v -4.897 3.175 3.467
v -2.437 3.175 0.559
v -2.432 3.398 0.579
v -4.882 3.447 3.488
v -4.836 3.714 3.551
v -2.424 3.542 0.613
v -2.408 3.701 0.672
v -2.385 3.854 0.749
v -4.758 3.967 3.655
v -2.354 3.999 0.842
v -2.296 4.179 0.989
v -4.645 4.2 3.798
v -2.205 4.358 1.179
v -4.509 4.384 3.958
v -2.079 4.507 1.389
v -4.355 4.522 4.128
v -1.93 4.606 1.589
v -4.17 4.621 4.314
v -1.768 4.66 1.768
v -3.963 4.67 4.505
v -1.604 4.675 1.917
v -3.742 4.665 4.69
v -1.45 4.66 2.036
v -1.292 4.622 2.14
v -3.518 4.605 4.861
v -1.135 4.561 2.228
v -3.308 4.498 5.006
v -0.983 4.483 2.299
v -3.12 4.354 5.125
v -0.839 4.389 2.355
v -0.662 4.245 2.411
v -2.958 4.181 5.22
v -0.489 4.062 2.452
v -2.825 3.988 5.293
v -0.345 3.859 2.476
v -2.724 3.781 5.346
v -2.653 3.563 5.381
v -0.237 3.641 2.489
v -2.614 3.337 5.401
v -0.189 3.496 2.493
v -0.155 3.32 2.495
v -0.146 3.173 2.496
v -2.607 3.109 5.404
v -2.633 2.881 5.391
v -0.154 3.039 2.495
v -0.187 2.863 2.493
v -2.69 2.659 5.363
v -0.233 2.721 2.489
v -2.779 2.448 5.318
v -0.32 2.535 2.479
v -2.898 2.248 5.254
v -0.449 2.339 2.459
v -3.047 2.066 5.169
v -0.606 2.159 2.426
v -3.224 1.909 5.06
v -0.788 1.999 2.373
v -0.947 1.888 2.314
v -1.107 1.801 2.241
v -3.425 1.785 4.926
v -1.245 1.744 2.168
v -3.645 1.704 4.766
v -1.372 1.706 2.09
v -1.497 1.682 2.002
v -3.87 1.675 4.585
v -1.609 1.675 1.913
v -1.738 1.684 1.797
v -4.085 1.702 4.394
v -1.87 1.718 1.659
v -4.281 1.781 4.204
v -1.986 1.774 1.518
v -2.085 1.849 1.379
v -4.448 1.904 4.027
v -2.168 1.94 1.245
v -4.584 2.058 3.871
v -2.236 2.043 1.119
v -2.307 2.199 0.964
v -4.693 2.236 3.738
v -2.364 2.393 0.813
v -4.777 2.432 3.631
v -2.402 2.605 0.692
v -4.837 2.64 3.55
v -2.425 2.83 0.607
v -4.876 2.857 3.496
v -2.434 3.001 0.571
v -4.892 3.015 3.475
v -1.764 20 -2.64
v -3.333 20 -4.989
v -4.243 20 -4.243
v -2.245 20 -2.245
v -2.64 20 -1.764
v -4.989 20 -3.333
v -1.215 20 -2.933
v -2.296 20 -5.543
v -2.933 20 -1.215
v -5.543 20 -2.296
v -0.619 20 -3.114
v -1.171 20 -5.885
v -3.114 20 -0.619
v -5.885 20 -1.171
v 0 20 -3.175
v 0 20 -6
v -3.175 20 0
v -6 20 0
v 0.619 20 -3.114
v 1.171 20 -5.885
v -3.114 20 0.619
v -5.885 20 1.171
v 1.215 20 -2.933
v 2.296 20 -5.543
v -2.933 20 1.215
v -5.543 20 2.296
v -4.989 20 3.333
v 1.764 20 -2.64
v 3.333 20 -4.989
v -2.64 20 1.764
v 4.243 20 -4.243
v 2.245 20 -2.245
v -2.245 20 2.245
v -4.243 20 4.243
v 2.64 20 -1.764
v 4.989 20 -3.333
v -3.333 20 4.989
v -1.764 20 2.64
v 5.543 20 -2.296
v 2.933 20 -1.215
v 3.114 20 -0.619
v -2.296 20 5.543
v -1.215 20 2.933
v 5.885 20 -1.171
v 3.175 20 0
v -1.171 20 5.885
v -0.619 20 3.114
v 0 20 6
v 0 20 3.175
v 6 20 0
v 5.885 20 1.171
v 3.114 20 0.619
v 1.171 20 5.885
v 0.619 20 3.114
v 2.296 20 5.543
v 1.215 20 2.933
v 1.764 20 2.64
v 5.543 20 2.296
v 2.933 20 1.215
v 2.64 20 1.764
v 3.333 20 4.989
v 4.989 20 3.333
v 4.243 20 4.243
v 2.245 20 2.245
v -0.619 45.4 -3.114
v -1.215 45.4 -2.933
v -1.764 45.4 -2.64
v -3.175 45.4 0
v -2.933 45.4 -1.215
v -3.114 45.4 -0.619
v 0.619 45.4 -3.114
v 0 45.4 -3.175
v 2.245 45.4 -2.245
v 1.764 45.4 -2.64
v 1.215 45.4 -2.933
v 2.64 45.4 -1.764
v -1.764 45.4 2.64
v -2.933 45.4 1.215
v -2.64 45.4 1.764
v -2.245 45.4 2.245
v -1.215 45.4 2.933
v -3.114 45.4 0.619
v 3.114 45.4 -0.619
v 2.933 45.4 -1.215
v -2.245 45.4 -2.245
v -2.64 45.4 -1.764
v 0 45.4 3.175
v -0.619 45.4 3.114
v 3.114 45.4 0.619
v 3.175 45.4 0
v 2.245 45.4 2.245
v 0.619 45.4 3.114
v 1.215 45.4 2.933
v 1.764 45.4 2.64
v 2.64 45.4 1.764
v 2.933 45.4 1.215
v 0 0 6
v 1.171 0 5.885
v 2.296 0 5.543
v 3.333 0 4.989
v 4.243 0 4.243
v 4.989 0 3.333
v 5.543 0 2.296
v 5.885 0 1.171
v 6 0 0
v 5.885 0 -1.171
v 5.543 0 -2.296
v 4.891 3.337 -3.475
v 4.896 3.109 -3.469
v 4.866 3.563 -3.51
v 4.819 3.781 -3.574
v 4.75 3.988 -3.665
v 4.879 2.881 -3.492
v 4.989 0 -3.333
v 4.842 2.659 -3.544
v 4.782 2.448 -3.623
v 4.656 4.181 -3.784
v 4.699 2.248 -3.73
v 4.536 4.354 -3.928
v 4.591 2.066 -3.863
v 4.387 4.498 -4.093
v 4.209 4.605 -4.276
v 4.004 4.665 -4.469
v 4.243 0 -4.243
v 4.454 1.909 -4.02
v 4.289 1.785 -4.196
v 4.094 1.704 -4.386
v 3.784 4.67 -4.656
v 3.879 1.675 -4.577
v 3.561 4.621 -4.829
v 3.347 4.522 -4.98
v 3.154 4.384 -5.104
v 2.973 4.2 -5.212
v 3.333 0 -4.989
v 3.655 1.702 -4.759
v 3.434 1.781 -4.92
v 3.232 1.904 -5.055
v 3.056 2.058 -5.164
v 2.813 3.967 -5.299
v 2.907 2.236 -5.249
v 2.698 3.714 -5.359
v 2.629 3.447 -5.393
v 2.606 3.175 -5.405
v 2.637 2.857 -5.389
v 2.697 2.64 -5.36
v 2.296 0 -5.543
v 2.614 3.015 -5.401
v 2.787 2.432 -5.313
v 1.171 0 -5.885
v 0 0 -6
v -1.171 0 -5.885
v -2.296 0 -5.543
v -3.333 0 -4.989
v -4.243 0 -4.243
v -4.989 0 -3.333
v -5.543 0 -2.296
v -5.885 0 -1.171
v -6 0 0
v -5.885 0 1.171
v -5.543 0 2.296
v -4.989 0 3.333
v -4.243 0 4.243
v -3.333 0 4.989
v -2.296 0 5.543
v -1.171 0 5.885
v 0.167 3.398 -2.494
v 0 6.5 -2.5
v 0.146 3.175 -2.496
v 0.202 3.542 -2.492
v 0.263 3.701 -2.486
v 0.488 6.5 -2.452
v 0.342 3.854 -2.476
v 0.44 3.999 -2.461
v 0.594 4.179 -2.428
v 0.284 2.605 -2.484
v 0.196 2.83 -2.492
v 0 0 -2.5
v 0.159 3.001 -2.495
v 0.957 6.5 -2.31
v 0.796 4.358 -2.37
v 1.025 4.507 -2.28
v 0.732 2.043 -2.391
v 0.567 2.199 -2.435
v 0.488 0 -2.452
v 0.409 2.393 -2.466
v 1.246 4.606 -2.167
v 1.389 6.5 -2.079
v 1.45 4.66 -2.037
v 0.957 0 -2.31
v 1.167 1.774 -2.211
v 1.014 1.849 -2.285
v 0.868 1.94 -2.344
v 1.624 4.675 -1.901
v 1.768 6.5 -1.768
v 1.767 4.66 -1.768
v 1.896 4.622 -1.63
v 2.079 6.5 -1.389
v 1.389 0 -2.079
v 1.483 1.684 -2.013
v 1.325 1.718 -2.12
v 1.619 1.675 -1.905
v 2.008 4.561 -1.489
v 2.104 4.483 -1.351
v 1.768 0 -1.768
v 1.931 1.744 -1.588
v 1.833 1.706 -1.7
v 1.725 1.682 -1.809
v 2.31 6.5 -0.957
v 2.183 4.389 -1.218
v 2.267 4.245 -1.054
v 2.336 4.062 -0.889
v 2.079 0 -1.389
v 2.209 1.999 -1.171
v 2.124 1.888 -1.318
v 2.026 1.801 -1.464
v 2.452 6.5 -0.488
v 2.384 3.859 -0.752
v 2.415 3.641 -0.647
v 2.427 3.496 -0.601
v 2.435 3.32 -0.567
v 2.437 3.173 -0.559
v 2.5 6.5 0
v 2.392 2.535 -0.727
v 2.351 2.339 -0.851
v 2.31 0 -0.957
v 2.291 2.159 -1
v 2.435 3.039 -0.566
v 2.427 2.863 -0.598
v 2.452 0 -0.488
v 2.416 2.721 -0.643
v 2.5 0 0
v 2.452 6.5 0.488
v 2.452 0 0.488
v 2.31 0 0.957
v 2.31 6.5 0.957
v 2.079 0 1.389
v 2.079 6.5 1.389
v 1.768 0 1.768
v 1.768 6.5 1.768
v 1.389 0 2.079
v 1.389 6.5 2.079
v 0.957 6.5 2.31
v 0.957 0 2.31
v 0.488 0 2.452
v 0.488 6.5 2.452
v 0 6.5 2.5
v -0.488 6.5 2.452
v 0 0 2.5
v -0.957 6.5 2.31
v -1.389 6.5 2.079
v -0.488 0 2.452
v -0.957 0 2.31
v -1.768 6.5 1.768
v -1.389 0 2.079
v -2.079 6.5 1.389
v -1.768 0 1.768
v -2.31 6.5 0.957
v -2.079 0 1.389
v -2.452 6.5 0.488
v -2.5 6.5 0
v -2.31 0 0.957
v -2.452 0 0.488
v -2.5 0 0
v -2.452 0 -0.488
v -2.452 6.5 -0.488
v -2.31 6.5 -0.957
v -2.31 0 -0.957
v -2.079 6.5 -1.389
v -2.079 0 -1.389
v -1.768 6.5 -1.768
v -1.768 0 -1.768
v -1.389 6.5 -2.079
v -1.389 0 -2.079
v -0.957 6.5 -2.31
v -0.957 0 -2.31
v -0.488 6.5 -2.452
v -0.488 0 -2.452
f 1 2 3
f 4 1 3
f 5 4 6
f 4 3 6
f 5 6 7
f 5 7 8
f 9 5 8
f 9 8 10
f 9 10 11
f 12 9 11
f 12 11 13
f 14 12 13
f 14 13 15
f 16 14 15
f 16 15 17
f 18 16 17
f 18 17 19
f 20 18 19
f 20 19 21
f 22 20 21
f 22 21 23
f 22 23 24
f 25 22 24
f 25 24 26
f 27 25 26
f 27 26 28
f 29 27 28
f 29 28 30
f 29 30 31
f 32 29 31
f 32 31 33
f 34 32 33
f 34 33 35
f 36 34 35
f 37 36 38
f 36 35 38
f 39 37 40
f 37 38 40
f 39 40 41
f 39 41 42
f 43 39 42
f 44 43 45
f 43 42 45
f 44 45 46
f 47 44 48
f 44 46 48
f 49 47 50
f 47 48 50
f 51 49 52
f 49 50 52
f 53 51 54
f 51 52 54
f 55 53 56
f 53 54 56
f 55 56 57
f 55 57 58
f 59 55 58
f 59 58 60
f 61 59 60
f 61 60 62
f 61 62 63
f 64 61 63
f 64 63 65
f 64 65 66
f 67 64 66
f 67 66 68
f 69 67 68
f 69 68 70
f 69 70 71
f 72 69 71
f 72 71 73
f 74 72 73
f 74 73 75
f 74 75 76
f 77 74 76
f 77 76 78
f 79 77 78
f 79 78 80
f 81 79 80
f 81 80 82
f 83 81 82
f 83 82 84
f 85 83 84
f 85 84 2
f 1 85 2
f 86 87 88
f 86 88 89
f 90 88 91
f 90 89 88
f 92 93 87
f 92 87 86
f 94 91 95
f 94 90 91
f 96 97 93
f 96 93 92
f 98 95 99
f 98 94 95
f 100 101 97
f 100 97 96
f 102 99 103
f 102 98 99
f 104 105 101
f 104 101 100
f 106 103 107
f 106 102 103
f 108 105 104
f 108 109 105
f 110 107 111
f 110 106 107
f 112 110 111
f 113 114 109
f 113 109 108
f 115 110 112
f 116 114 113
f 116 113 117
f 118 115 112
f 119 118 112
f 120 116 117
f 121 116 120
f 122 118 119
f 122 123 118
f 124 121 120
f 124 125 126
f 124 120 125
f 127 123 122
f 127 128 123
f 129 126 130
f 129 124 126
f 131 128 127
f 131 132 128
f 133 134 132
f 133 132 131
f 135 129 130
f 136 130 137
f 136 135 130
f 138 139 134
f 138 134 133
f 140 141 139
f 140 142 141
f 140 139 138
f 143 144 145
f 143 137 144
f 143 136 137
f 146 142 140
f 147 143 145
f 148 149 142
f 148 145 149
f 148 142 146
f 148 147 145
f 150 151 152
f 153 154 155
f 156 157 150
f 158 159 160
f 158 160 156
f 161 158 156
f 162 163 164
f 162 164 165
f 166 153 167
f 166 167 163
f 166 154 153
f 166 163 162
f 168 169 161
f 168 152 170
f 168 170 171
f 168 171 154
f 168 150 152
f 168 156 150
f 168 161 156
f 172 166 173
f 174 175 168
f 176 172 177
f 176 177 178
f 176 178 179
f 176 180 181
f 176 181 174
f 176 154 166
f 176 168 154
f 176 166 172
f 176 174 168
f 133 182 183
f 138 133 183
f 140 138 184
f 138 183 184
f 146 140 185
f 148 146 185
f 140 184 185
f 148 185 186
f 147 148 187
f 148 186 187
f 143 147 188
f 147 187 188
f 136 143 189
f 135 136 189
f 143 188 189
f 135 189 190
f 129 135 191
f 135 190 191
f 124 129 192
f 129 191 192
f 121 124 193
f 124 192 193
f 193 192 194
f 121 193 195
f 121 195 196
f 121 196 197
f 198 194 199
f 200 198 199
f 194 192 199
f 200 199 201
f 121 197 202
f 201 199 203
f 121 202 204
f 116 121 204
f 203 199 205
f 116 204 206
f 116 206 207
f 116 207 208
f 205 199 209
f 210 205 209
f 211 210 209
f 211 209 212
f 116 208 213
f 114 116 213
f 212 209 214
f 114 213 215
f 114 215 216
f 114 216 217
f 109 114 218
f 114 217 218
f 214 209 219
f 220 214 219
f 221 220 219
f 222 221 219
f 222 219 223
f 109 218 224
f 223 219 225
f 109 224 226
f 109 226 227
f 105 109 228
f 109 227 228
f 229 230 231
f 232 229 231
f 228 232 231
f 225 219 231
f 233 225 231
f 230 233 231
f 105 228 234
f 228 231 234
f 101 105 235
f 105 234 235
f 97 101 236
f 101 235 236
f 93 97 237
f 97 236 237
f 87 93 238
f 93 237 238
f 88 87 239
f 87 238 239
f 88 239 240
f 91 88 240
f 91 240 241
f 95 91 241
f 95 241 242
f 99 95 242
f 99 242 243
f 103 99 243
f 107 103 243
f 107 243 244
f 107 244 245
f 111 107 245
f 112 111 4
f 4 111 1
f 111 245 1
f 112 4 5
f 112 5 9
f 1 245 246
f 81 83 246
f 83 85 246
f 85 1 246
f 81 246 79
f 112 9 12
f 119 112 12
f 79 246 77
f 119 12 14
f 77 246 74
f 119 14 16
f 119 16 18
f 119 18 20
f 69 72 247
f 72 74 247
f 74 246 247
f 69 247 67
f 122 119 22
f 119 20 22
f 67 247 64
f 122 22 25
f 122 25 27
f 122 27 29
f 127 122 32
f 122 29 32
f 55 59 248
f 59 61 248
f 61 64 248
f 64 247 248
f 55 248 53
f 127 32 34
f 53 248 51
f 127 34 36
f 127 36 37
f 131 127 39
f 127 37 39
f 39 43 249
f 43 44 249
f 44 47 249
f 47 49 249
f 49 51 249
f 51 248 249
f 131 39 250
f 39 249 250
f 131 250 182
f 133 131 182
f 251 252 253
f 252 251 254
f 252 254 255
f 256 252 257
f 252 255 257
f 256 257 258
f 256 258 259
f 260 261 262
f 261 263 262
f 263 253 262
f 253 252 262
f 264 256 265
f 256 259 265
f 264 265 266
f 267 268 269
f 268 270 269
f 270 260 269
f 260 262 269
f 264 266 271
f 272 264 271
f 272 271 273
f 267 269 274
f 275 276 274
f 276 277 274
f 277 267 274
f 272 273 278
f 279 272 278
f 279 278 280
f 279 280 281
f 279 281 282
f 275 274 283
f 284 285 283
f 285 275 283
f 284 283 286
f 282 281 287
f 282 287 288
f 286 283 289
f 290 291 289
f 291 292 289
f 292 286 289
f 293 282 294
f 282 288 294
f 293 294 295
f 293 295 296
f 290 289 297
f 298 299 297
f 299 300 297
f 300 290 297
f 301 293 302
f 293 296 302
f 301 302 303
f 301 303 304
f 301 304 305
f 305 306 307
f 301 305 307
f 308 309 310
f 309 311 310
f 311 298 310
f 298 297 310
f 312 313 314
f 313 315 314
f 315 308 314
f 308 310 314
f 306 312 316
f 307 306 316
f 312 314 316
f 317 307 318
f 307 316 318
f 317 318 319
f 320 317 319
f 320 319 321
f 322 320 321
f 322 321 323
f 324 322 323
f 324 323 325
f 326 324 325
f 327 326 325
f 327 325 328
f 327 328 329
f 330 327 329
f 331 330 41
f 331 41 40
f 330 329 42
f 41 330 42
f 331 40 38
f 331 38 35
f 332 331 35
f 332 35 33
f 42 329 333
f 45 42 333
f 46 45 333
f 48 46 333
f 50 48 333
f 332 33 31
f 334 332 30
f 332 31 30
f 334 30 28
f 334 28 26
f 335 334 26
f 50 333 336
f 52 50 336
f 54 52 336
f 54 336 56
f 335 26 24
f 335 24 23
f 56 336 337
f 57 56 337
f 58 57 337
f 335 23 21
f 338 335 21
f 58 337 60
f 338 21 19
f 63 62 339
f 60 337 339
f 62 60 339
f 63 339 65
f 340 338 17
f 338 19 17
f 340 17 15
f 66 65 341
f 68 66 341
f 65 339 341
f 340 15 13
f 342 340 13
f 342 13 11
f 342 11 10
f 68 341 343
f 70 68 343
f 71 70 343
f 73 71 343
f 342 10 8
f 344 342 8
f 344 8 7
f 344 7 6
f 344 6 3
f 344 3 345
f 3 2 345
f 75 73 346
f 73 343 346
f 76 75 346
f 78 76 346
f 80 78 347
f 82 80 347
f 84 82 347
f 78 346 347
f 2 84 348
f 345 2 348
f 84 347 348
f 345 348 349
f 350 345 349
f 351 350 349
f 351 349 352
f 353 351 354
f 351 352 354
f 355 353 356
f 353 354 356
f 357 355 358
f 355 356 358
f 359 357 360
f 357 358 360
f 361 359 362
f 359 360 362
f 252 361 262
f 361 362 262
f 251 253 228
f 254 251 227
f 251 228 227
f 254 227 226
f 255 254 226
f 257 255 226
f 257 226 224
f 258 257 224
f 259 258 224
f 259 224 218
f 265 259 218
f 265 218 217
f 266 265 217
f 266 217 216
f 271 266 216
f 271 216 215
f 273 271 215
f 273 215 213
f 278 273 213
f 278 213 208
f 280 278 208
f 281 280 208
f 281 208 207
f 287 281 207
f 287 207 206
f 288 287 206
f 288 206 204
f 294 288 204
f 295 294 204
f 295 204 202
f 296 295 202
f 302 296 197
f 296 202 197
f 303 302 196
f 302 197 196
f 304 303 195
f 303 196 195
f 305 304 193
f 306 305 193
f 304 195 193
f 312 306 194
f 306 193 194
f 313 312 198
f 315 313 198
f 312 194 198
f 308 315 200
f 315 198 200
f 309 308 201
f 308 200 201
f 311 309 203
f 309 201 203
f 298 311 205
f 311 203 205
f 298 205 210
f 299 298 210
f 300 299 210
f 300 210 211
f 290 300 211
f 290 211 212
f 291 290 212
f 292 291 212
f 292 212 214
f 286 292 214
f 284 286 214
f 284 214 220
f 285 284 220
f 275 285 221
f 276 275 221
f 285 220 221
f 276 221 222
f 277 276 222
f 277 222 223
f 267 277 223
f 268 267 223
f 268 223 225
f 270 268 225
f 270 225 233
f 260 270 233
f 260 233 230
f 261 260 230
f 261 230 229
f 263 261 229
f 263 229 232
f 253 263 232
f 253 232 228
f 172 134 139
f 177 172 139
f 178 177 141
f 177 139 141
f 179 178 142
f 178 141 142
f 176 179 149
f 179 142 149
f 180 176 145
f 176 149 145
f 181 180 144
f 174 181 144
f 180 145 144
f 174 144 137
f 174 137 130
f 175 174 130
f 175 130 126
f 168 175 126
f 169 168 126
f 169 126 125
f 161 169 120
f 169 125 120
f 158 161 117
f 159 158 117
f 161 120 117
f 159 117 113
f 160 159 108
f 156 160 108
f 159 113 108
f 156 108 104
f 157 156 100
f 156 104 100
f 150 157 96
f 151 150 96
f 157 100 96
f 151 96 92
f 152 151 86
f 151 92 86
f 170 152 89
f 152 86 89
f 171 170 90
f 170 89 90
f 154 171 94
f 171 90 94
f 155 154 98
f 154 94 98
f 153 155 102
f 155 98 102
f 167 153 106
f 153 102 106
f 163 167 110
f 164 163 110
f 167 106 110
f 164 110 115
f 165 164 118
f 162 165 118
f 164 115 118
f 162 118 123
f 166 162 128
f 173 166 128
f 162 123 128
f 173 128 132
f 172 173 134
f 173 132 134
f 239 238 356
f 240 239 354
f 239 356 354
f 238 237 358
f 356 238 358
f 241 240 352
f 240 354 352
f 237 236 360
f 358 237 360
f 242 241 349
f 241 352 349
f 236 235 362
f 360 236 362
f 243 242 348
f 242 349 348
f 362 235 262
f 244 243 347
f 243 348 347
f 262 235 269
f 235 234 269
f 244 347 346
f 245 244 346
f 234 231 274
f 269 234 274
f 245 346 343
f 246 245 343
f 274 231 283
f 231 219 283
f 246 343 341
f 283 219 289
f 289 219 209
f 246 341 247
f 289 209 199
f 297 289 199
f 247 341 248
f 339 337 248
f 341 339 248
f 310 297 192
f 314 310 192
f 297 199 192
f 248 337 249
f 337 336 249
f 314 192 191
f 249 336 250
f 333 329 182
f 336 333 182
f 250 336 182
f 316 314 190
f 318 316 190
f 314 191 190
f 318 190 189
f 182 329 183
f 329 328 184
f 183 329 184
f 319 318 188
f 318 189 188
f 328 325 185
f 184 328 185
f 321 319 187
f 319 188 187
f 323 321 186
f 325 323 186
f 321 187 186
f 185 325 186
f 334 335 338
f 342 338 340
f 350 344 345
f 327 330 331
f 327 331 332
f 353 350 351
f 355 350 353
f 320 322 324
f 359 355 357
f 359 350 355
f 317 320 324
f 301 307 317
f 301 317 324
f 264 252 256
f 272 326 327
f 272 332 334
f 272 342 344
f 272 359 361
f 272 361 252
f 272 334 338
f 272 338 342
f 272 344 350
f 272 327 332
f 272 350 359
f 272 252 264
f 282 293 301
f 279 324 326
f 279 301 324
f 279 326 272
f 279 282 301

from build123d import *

# Parameters (mm, degrees)
SKETCH1_R             = 6
BOSS_EXTRUDE1_DEPTH   = 20
SKETCH2_R             = 3.175
BOSS_EXTRUDE2_DEPTH   = 25.4
SKETCH4_R             = 2.5
CUT_EXTRUDE1_DEPTH    = 6.5
F_3_0MM_DOWEL_HOLE1_D = 3


with BuildPart() as part:
    # Sketch1 → Boss-Extrude1 (new body)
    with BuildSketch(Plane(origin=(0, 0, 0), x_dir=(1, 0, 0), z_dir=(0, 1, 0))):
        with Locations(Location((0, 0, 0), (0, 0, 270))):
            Circle(SKETCH1_R)
    extrude(amount=BOSS_EXTRUDE1_DEPTH)

    # Sketch2 → Boss-Extrude2 (add)
    with BuildSketch(Plane(origin=(0, 20, 0), x_dir=(1, 0, 0), z_dir=(0, 1, 0))):
        with Locations(Location((0, 0, 0), (0, 0, 270))):
            Circle(SKETCH2_R)
    extrude(amount=BOSS_EXTRUDE2_DEPTH)

    # Sketch4 → Cut-Extrude1 (cut)
    with BuildSketch(Plane(origin=(0, 0, 0), x_dir=(-1, 0, 0), z_dir=(0, -1, 0))):
        with Locations(Location((0, 0, 0), (0, 0, 90))):
            Circle(SKETCH4_R)
    extrude(amount=-CUT_EXTRUDE1_DEPTH, mode=Mode.SUBTRACT)

    # Ø3.0mm Dowel Hole1 (through all)
    with Locations(Plane(origin=(-3.874280367, 3.174847953, 4.581479197), x_dir=(0.763579866236, 0, 0.645713394533), z_dir=(-0.645713394533, 0, 0.763579866236))):
        with Locations((0, 0)):
            Hole(F_3_0MM_DOWEL_HOLE1_D / 2)


solid = part.part
